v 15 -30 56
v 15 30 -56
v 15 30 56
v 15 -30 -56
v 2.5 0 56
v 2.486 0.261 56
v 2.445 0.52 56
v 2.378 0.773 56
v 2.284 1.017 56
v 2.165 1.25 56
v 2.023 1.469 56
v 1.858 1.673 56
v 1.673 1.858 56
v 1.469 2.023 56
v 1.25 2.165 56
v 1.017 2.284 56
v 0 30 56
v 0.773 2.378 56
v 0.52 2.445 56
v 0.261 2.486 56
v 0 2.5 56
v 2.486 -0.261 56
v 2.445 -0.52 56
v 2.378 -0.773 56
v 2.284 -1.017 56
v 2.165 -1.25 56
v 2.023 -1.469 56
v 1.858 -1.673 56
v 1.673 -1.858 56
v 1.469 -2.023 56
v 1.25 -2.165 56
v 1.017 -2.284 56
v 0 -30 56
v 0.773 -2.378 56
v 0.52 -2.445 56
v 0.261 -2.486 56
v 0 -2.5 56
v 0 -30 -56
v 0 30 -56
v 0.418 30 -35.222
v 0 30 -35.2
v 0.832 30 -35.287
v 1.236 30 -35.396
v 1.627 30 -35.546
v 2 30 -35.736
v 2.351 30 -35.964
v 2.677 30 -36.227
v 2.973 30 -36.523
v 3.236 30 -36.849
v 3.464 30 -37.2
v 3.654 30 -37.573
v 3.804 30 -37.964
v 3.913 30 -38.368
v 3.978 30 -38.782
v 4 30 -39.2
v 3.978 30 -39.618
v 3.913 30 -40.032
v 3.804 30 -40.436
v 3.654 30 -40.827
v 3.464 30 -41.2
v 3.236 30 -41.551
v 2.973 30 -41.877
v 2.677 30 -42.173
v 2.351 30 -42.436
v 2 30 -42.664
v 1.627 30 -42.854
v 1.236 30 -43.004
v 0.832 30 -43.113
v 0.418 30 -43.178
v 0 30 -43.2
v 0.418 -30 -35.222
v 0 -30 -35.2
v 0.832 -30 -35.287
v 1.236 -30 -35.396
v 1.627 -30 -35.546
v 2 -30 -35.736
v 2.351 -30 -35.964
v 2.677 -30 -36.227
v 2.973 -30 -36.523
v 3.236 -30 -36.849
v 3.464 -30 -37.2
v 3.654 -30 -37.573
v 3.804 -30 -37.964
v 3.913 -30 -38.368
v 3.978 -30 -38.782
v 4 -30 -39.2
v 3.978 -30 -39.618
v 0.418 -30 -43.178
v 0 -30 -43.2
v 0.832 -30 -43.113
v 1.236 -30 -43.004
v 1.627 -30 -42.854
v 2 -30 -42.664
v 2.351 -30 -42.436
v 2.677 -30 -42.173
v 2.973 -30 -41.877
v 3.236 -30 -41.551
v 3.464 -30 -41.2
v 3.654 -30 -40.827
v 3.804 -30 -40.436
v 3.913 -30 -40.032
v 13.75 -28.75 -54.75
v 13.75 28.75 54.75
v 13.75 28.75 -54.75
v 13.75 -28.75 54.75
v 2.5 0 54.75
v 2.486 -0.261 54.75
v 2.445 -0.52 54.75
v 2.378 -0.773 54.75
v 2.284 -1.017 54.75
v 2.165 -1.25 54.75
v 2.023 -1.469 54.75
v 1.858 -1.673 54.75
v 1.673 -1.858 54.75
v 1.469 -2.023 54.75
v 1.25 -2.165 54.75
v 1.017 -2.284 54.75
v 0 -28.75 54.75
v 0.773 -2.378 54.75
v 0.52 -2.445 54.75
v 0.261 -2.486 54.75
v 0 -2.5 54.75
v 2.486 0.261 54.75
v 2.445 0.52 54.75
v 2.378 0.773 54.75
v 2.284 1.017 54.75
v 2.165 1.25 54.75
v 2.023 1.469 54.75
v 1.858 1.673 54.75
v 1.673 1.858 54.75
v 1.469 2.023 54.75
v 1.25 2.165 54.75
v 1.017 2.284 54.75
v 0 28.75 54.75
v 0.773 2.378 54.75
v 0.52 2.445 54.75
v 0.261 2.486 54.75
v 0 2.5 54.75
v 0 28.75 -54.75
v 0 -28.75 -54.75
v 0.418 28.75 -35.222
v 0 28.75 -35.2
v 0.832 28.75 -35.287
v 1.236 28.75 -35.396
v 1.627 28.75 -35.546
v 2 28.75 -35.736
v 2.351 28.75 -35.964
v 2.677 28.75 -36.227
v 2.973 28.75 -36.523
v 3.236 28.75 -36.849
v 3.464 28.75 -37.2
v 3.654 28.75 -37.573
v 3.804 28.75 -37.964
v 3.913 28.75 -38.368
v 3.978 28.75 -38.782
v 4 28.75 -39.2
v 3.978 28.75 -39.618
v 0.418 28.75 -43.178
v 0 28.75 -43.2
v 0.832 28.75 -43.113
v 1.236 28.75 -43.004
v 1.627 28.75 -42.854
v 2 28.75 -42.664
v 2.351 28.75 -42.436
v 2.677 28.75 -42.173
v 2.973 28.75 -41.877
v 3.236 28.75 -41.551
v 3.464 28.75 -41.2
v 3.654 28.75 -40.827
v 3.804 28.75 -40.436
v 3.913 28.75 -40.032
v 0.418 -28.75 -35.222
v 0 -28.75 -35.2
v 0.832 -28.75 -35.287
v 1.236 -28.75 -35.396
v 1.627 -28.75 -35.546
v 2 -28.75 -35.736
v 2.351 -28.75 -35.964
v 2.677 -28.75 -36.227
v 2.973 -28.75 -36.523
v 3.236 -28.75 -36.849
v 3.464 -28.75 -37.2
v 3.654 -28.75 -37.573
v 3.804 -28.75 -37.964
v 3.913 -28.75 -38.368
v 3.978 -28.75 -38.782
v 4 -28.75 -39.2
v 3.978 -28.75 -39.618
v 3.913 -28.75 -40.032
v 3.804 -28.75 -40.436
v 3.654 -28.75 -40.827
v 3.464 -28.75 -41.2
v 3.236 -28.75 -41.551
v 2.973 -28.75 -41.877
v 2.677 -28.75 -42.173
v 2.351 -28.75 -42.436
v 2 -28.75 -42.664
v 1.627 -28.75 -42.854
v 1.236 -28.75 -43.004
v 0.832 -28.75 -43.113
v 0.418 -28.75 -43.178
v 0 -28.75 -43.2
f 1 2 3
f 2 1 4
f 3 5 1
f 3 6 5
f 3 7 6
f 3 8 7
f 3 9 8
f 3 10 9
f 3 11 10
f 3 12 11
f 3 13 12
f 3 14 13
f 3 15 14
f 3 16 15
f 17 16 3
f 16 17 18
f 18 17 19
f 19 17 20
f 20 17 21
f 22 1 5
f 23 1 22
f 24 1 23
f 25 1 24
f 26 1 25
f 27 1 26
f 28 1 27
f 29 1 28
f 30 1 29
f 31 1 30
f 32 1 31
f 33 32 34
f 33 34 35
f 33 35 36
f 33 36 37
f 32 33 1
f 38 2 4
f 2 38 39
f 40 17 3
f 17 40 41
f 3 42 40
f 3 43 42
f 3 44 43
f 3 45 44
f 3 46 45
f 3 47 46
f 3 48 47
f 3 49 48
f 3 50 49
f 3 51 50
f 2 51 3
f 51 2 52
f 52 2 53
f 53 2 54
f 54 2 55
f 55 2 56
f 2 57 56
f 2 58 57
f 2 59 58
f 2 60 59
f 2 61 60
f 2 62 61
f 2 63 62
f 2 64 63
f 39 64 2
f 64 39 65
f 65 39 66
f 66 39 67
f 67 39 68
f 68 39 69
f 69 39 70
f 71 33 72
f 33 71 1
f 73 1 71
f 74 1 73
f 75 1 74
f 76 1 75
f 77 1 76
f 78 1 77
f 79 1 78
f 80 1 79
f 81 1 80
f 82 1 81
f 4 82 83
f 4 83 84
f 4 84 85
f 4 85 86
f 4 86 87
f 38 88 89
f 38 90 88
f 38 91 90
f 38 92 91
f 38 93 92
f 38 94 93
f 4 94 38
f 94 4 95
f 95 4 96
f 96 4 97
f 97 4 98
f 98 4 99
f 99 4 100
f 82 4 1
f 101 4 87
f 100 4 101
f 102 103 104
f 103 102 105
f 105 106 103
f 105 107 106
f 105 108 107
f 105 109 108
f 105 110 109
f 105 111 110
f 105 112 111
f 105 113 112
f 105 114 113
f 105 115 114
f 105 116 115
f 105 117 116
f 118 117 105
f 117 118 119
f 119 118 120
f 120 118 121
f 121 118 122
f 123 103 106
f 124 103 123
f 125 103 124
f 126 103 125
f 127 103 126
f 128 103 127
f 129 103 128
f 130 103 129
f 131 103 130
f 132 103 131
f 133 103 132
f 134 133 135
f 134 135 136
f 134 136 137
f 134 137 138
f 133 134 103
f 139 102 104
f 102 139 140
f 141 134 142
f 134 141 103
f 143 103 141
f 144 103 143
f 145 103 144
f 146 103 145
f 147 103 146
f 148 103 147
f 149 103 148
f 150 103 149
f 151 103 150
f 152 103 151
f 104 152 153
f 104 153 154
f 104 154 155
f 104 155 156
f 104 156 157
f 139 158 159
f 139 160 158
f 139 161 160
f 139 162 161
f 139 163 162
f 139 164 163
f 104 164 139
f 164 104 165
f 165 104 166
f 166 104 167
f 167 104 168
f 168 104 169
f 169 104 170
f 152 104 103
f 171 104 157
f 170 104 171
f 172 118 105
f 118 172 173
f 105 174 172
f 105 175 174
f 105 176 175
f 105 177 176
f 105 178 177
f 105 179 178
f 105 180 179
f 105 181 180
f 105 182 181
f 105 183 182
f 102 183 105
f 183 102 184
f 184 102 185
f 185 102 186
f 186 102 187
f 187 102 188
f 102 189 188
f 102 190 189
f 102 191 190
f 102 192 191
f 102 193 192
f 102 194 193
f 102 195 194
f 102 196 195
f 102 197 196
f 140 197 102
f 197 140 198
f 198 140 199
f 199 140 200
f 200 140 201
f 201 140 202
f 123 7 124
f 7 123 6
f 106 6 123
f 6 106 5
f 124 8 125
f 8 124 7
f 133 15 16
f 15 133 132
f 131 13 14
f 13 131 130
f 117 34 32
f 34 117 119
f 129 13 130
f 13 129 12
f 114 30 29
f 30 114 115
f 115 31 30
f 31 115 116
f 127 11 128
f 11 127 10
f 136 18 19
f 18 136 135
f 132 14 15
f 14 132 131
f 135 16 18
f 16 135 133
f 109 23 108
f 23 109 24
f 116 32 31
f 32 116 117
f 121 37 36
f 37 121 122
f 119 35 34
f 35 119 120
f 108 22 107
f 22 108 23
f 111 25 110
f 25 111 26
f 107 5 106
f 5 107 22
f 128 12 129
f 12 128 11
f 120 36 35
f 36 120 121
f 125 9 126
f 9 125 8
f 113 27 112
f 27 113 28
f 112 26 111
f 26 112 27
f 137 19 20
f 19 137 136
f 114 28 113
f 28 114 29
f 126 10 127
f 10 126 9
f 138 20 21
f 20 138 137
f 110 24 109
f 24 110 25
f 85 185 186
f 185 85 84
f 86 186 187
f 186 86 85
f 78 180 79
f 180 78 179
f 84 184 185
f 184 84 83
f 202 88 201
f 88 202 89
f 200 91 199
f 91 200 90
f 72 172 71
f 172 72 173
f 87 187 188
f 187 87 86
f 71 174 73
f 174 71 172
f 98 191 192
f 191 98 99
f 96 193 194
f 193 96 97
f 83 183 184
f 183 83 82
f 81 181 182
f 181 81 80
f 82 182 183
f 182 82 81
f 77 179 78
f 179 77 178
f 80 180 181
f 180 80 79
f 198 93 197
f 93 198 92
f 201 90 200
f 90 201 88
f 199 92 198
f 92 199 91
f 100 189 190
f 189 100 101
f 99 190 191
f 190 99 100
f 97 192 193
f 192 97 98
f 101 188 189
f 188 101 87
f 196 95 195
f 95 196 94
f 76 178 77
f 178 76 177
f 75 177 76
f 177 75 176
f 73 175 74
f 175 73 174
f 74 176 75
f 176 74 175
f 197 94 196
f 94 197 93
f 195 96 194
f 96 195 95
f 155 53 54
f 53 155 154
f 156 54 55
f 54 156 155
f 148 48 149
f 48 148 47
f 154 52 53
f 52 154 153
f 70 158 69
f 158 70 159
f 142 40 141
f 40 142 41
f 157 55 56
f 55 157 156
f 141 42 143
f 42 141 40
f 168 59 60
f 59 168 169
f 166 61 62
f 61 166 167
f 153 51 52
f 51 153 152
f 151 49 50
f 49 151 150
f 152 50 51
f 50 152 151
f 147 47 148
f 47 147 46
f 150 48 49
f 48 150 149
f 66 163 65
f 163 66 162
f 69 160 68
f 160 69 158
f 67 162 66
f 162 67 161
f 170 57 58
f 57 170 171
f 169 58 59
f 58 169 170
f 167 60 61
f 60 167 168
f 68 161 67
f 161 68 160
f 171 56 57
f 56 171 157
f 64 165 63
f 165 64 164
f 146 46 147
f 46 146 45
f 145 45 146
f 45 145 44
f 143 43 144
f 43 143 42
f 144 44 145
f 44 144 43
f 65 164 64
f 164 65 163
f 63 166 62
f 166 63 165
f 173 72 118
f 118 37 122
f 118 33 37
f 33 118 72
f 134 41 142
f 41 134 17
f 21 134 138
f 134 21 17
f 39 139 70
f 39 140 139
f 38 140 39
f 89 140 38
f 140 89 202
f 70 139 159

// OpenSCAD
switch_hole_diameter = 5;

cable_hole_diameter = 8;

overall_box_width = 30;

overall_box_height = 112;

overall_box_depth = 60;

box_wall_width = 2.5;

// offset the switch hole so that it is positioned in the 
// center of the box even with the lid on
switch_hole_offset = 0;

screw_diameter = 3.5;

screw_column_height = 3;

screw_column_wall_width = 1.5;


//versetzen : 16 nach unten, 5 nach links

// Loecher im Relais: 31 x 62

module box() {
// cut away switch hole
difference(){
    
    // cut away inner part of main box
    difference() {
        // main box
        cube([overall_box_width,overall_box_depth,overall_box_height],true);

        // inner part
//        translate([box_wall_width / 2, 0, 0]){
            cube([
                overall_box_width - box_wall_width,
                overall_box_depth - box_wall_width,
                overall_box_height - box_wall_width
                ],
                true);
            }
//        }
        
        // cylinder describing the data cable hole
        translate([switch_hole_offset,0, overall_box_height / 2]) {
            cylinder(h = box_wall_width * 2, r=switch_hole_diameter / 2, center=true, $fn=60);
        }


    
    // cut out power holes
    translate([0,-overall_box_depth / 2,-overall_box_height / 2 * 0.7]){
    rotate(90,[1,0,0]){
        cylinder(h = box_wall_width * 2, r=cable_hole_diameter / 2, center=true, $fn=60);
        }
    }

    translate([0,overall_box_depth / 2,-overall_box_height / 2 * 0.7]){
    rotate(90,[1,0,0]){
        cylinder(h = box_wall_width * 2, r=cable_hole_diameter / 2, center=true, $fn=60);
        }
    }
    
    // create union of four screw holes and cut them out 
    union(){
        translate([
            -(overall_box_width / 2),
            -overall_box_depth / 2 * 0.5 - 5,
            overall_box_height / 2 * 0.7 - 16]){
            screw_inner();
        }

        translate([
            -(overall_box_width / 2),
            -overall_box_depth / 2 * 0.5 + 26,
            overall_box_height / 2 * 0.7 - 16]){
            screw_inner();
        }


        translate([
            -(overall_box_width / 2),
            -overall_box_depth / 2 * 0.5 + 26,
            overall_box_height / 2 * 0.7 - 68]){
            screw_inner();
        }

        translate([
            -(overall_box_width / 2),
            -overall_box_depth / 2 * 0.5 - 5,
            overall_box_height / 2 * 0.7 - 68]){
            screw_inner();
        }
    }
}

//
translate([
    -(overall_box_width / 2 - screw_column_height/2),
    -overall_box_depth / 2 * 0.5 - 5,
    overall_box_height / 2 * 0.7 - 16]){
    screw_column();
}

translate([
    -(overall_box_width / 2 - screw_column_height/2),
    -overall_box_depth / 2 * 0.5 + 26,
    overall_box_height / 2 * 0.7 - 16]){
    screw_column();
}


translate([
    -(overall_box_width / 2 - screw_column_height/2 ),
    -overall_box_depth / 2 * 0.5 + 26,
    overall_box_height / 2 * 0.7 - 68]){
    screw_column();
}

translate([
    -(overall_box_width / 2 - screw_column_height/2  ),
    -overall_box_depth / 2 * 0.5 - 5,
    overall_box_height / 2 * 0.7 - 68]){
    screw_column();
}
}

module screw_column() {
    rotate(90,[0,1,0]) {
        difference(){
            cylinder(h = screw_column_height, r=screw_diameter / 2 + screw_column_wall_width, center=true, $fn=60);
            cylinder(h = screw_column_height, r=screw_diameter / 2, center=true, $fn=60);

        }
    }
}

module screw_inner(){
    rotate(90,[0,1,0]) {
        cylinder(h = screw_column_height * 2, r=screw_diameter / 2, center=true, $fn=60);
    }
}

intersection(){
    // top
    translate([500,0,0]) cube([1000,1000,1000], center=true);

    // bottom
//    translate([-500,0,0]) cube([1000,1000,1000], center=true);
    box();
    // translate([0,0,0])box();
}
